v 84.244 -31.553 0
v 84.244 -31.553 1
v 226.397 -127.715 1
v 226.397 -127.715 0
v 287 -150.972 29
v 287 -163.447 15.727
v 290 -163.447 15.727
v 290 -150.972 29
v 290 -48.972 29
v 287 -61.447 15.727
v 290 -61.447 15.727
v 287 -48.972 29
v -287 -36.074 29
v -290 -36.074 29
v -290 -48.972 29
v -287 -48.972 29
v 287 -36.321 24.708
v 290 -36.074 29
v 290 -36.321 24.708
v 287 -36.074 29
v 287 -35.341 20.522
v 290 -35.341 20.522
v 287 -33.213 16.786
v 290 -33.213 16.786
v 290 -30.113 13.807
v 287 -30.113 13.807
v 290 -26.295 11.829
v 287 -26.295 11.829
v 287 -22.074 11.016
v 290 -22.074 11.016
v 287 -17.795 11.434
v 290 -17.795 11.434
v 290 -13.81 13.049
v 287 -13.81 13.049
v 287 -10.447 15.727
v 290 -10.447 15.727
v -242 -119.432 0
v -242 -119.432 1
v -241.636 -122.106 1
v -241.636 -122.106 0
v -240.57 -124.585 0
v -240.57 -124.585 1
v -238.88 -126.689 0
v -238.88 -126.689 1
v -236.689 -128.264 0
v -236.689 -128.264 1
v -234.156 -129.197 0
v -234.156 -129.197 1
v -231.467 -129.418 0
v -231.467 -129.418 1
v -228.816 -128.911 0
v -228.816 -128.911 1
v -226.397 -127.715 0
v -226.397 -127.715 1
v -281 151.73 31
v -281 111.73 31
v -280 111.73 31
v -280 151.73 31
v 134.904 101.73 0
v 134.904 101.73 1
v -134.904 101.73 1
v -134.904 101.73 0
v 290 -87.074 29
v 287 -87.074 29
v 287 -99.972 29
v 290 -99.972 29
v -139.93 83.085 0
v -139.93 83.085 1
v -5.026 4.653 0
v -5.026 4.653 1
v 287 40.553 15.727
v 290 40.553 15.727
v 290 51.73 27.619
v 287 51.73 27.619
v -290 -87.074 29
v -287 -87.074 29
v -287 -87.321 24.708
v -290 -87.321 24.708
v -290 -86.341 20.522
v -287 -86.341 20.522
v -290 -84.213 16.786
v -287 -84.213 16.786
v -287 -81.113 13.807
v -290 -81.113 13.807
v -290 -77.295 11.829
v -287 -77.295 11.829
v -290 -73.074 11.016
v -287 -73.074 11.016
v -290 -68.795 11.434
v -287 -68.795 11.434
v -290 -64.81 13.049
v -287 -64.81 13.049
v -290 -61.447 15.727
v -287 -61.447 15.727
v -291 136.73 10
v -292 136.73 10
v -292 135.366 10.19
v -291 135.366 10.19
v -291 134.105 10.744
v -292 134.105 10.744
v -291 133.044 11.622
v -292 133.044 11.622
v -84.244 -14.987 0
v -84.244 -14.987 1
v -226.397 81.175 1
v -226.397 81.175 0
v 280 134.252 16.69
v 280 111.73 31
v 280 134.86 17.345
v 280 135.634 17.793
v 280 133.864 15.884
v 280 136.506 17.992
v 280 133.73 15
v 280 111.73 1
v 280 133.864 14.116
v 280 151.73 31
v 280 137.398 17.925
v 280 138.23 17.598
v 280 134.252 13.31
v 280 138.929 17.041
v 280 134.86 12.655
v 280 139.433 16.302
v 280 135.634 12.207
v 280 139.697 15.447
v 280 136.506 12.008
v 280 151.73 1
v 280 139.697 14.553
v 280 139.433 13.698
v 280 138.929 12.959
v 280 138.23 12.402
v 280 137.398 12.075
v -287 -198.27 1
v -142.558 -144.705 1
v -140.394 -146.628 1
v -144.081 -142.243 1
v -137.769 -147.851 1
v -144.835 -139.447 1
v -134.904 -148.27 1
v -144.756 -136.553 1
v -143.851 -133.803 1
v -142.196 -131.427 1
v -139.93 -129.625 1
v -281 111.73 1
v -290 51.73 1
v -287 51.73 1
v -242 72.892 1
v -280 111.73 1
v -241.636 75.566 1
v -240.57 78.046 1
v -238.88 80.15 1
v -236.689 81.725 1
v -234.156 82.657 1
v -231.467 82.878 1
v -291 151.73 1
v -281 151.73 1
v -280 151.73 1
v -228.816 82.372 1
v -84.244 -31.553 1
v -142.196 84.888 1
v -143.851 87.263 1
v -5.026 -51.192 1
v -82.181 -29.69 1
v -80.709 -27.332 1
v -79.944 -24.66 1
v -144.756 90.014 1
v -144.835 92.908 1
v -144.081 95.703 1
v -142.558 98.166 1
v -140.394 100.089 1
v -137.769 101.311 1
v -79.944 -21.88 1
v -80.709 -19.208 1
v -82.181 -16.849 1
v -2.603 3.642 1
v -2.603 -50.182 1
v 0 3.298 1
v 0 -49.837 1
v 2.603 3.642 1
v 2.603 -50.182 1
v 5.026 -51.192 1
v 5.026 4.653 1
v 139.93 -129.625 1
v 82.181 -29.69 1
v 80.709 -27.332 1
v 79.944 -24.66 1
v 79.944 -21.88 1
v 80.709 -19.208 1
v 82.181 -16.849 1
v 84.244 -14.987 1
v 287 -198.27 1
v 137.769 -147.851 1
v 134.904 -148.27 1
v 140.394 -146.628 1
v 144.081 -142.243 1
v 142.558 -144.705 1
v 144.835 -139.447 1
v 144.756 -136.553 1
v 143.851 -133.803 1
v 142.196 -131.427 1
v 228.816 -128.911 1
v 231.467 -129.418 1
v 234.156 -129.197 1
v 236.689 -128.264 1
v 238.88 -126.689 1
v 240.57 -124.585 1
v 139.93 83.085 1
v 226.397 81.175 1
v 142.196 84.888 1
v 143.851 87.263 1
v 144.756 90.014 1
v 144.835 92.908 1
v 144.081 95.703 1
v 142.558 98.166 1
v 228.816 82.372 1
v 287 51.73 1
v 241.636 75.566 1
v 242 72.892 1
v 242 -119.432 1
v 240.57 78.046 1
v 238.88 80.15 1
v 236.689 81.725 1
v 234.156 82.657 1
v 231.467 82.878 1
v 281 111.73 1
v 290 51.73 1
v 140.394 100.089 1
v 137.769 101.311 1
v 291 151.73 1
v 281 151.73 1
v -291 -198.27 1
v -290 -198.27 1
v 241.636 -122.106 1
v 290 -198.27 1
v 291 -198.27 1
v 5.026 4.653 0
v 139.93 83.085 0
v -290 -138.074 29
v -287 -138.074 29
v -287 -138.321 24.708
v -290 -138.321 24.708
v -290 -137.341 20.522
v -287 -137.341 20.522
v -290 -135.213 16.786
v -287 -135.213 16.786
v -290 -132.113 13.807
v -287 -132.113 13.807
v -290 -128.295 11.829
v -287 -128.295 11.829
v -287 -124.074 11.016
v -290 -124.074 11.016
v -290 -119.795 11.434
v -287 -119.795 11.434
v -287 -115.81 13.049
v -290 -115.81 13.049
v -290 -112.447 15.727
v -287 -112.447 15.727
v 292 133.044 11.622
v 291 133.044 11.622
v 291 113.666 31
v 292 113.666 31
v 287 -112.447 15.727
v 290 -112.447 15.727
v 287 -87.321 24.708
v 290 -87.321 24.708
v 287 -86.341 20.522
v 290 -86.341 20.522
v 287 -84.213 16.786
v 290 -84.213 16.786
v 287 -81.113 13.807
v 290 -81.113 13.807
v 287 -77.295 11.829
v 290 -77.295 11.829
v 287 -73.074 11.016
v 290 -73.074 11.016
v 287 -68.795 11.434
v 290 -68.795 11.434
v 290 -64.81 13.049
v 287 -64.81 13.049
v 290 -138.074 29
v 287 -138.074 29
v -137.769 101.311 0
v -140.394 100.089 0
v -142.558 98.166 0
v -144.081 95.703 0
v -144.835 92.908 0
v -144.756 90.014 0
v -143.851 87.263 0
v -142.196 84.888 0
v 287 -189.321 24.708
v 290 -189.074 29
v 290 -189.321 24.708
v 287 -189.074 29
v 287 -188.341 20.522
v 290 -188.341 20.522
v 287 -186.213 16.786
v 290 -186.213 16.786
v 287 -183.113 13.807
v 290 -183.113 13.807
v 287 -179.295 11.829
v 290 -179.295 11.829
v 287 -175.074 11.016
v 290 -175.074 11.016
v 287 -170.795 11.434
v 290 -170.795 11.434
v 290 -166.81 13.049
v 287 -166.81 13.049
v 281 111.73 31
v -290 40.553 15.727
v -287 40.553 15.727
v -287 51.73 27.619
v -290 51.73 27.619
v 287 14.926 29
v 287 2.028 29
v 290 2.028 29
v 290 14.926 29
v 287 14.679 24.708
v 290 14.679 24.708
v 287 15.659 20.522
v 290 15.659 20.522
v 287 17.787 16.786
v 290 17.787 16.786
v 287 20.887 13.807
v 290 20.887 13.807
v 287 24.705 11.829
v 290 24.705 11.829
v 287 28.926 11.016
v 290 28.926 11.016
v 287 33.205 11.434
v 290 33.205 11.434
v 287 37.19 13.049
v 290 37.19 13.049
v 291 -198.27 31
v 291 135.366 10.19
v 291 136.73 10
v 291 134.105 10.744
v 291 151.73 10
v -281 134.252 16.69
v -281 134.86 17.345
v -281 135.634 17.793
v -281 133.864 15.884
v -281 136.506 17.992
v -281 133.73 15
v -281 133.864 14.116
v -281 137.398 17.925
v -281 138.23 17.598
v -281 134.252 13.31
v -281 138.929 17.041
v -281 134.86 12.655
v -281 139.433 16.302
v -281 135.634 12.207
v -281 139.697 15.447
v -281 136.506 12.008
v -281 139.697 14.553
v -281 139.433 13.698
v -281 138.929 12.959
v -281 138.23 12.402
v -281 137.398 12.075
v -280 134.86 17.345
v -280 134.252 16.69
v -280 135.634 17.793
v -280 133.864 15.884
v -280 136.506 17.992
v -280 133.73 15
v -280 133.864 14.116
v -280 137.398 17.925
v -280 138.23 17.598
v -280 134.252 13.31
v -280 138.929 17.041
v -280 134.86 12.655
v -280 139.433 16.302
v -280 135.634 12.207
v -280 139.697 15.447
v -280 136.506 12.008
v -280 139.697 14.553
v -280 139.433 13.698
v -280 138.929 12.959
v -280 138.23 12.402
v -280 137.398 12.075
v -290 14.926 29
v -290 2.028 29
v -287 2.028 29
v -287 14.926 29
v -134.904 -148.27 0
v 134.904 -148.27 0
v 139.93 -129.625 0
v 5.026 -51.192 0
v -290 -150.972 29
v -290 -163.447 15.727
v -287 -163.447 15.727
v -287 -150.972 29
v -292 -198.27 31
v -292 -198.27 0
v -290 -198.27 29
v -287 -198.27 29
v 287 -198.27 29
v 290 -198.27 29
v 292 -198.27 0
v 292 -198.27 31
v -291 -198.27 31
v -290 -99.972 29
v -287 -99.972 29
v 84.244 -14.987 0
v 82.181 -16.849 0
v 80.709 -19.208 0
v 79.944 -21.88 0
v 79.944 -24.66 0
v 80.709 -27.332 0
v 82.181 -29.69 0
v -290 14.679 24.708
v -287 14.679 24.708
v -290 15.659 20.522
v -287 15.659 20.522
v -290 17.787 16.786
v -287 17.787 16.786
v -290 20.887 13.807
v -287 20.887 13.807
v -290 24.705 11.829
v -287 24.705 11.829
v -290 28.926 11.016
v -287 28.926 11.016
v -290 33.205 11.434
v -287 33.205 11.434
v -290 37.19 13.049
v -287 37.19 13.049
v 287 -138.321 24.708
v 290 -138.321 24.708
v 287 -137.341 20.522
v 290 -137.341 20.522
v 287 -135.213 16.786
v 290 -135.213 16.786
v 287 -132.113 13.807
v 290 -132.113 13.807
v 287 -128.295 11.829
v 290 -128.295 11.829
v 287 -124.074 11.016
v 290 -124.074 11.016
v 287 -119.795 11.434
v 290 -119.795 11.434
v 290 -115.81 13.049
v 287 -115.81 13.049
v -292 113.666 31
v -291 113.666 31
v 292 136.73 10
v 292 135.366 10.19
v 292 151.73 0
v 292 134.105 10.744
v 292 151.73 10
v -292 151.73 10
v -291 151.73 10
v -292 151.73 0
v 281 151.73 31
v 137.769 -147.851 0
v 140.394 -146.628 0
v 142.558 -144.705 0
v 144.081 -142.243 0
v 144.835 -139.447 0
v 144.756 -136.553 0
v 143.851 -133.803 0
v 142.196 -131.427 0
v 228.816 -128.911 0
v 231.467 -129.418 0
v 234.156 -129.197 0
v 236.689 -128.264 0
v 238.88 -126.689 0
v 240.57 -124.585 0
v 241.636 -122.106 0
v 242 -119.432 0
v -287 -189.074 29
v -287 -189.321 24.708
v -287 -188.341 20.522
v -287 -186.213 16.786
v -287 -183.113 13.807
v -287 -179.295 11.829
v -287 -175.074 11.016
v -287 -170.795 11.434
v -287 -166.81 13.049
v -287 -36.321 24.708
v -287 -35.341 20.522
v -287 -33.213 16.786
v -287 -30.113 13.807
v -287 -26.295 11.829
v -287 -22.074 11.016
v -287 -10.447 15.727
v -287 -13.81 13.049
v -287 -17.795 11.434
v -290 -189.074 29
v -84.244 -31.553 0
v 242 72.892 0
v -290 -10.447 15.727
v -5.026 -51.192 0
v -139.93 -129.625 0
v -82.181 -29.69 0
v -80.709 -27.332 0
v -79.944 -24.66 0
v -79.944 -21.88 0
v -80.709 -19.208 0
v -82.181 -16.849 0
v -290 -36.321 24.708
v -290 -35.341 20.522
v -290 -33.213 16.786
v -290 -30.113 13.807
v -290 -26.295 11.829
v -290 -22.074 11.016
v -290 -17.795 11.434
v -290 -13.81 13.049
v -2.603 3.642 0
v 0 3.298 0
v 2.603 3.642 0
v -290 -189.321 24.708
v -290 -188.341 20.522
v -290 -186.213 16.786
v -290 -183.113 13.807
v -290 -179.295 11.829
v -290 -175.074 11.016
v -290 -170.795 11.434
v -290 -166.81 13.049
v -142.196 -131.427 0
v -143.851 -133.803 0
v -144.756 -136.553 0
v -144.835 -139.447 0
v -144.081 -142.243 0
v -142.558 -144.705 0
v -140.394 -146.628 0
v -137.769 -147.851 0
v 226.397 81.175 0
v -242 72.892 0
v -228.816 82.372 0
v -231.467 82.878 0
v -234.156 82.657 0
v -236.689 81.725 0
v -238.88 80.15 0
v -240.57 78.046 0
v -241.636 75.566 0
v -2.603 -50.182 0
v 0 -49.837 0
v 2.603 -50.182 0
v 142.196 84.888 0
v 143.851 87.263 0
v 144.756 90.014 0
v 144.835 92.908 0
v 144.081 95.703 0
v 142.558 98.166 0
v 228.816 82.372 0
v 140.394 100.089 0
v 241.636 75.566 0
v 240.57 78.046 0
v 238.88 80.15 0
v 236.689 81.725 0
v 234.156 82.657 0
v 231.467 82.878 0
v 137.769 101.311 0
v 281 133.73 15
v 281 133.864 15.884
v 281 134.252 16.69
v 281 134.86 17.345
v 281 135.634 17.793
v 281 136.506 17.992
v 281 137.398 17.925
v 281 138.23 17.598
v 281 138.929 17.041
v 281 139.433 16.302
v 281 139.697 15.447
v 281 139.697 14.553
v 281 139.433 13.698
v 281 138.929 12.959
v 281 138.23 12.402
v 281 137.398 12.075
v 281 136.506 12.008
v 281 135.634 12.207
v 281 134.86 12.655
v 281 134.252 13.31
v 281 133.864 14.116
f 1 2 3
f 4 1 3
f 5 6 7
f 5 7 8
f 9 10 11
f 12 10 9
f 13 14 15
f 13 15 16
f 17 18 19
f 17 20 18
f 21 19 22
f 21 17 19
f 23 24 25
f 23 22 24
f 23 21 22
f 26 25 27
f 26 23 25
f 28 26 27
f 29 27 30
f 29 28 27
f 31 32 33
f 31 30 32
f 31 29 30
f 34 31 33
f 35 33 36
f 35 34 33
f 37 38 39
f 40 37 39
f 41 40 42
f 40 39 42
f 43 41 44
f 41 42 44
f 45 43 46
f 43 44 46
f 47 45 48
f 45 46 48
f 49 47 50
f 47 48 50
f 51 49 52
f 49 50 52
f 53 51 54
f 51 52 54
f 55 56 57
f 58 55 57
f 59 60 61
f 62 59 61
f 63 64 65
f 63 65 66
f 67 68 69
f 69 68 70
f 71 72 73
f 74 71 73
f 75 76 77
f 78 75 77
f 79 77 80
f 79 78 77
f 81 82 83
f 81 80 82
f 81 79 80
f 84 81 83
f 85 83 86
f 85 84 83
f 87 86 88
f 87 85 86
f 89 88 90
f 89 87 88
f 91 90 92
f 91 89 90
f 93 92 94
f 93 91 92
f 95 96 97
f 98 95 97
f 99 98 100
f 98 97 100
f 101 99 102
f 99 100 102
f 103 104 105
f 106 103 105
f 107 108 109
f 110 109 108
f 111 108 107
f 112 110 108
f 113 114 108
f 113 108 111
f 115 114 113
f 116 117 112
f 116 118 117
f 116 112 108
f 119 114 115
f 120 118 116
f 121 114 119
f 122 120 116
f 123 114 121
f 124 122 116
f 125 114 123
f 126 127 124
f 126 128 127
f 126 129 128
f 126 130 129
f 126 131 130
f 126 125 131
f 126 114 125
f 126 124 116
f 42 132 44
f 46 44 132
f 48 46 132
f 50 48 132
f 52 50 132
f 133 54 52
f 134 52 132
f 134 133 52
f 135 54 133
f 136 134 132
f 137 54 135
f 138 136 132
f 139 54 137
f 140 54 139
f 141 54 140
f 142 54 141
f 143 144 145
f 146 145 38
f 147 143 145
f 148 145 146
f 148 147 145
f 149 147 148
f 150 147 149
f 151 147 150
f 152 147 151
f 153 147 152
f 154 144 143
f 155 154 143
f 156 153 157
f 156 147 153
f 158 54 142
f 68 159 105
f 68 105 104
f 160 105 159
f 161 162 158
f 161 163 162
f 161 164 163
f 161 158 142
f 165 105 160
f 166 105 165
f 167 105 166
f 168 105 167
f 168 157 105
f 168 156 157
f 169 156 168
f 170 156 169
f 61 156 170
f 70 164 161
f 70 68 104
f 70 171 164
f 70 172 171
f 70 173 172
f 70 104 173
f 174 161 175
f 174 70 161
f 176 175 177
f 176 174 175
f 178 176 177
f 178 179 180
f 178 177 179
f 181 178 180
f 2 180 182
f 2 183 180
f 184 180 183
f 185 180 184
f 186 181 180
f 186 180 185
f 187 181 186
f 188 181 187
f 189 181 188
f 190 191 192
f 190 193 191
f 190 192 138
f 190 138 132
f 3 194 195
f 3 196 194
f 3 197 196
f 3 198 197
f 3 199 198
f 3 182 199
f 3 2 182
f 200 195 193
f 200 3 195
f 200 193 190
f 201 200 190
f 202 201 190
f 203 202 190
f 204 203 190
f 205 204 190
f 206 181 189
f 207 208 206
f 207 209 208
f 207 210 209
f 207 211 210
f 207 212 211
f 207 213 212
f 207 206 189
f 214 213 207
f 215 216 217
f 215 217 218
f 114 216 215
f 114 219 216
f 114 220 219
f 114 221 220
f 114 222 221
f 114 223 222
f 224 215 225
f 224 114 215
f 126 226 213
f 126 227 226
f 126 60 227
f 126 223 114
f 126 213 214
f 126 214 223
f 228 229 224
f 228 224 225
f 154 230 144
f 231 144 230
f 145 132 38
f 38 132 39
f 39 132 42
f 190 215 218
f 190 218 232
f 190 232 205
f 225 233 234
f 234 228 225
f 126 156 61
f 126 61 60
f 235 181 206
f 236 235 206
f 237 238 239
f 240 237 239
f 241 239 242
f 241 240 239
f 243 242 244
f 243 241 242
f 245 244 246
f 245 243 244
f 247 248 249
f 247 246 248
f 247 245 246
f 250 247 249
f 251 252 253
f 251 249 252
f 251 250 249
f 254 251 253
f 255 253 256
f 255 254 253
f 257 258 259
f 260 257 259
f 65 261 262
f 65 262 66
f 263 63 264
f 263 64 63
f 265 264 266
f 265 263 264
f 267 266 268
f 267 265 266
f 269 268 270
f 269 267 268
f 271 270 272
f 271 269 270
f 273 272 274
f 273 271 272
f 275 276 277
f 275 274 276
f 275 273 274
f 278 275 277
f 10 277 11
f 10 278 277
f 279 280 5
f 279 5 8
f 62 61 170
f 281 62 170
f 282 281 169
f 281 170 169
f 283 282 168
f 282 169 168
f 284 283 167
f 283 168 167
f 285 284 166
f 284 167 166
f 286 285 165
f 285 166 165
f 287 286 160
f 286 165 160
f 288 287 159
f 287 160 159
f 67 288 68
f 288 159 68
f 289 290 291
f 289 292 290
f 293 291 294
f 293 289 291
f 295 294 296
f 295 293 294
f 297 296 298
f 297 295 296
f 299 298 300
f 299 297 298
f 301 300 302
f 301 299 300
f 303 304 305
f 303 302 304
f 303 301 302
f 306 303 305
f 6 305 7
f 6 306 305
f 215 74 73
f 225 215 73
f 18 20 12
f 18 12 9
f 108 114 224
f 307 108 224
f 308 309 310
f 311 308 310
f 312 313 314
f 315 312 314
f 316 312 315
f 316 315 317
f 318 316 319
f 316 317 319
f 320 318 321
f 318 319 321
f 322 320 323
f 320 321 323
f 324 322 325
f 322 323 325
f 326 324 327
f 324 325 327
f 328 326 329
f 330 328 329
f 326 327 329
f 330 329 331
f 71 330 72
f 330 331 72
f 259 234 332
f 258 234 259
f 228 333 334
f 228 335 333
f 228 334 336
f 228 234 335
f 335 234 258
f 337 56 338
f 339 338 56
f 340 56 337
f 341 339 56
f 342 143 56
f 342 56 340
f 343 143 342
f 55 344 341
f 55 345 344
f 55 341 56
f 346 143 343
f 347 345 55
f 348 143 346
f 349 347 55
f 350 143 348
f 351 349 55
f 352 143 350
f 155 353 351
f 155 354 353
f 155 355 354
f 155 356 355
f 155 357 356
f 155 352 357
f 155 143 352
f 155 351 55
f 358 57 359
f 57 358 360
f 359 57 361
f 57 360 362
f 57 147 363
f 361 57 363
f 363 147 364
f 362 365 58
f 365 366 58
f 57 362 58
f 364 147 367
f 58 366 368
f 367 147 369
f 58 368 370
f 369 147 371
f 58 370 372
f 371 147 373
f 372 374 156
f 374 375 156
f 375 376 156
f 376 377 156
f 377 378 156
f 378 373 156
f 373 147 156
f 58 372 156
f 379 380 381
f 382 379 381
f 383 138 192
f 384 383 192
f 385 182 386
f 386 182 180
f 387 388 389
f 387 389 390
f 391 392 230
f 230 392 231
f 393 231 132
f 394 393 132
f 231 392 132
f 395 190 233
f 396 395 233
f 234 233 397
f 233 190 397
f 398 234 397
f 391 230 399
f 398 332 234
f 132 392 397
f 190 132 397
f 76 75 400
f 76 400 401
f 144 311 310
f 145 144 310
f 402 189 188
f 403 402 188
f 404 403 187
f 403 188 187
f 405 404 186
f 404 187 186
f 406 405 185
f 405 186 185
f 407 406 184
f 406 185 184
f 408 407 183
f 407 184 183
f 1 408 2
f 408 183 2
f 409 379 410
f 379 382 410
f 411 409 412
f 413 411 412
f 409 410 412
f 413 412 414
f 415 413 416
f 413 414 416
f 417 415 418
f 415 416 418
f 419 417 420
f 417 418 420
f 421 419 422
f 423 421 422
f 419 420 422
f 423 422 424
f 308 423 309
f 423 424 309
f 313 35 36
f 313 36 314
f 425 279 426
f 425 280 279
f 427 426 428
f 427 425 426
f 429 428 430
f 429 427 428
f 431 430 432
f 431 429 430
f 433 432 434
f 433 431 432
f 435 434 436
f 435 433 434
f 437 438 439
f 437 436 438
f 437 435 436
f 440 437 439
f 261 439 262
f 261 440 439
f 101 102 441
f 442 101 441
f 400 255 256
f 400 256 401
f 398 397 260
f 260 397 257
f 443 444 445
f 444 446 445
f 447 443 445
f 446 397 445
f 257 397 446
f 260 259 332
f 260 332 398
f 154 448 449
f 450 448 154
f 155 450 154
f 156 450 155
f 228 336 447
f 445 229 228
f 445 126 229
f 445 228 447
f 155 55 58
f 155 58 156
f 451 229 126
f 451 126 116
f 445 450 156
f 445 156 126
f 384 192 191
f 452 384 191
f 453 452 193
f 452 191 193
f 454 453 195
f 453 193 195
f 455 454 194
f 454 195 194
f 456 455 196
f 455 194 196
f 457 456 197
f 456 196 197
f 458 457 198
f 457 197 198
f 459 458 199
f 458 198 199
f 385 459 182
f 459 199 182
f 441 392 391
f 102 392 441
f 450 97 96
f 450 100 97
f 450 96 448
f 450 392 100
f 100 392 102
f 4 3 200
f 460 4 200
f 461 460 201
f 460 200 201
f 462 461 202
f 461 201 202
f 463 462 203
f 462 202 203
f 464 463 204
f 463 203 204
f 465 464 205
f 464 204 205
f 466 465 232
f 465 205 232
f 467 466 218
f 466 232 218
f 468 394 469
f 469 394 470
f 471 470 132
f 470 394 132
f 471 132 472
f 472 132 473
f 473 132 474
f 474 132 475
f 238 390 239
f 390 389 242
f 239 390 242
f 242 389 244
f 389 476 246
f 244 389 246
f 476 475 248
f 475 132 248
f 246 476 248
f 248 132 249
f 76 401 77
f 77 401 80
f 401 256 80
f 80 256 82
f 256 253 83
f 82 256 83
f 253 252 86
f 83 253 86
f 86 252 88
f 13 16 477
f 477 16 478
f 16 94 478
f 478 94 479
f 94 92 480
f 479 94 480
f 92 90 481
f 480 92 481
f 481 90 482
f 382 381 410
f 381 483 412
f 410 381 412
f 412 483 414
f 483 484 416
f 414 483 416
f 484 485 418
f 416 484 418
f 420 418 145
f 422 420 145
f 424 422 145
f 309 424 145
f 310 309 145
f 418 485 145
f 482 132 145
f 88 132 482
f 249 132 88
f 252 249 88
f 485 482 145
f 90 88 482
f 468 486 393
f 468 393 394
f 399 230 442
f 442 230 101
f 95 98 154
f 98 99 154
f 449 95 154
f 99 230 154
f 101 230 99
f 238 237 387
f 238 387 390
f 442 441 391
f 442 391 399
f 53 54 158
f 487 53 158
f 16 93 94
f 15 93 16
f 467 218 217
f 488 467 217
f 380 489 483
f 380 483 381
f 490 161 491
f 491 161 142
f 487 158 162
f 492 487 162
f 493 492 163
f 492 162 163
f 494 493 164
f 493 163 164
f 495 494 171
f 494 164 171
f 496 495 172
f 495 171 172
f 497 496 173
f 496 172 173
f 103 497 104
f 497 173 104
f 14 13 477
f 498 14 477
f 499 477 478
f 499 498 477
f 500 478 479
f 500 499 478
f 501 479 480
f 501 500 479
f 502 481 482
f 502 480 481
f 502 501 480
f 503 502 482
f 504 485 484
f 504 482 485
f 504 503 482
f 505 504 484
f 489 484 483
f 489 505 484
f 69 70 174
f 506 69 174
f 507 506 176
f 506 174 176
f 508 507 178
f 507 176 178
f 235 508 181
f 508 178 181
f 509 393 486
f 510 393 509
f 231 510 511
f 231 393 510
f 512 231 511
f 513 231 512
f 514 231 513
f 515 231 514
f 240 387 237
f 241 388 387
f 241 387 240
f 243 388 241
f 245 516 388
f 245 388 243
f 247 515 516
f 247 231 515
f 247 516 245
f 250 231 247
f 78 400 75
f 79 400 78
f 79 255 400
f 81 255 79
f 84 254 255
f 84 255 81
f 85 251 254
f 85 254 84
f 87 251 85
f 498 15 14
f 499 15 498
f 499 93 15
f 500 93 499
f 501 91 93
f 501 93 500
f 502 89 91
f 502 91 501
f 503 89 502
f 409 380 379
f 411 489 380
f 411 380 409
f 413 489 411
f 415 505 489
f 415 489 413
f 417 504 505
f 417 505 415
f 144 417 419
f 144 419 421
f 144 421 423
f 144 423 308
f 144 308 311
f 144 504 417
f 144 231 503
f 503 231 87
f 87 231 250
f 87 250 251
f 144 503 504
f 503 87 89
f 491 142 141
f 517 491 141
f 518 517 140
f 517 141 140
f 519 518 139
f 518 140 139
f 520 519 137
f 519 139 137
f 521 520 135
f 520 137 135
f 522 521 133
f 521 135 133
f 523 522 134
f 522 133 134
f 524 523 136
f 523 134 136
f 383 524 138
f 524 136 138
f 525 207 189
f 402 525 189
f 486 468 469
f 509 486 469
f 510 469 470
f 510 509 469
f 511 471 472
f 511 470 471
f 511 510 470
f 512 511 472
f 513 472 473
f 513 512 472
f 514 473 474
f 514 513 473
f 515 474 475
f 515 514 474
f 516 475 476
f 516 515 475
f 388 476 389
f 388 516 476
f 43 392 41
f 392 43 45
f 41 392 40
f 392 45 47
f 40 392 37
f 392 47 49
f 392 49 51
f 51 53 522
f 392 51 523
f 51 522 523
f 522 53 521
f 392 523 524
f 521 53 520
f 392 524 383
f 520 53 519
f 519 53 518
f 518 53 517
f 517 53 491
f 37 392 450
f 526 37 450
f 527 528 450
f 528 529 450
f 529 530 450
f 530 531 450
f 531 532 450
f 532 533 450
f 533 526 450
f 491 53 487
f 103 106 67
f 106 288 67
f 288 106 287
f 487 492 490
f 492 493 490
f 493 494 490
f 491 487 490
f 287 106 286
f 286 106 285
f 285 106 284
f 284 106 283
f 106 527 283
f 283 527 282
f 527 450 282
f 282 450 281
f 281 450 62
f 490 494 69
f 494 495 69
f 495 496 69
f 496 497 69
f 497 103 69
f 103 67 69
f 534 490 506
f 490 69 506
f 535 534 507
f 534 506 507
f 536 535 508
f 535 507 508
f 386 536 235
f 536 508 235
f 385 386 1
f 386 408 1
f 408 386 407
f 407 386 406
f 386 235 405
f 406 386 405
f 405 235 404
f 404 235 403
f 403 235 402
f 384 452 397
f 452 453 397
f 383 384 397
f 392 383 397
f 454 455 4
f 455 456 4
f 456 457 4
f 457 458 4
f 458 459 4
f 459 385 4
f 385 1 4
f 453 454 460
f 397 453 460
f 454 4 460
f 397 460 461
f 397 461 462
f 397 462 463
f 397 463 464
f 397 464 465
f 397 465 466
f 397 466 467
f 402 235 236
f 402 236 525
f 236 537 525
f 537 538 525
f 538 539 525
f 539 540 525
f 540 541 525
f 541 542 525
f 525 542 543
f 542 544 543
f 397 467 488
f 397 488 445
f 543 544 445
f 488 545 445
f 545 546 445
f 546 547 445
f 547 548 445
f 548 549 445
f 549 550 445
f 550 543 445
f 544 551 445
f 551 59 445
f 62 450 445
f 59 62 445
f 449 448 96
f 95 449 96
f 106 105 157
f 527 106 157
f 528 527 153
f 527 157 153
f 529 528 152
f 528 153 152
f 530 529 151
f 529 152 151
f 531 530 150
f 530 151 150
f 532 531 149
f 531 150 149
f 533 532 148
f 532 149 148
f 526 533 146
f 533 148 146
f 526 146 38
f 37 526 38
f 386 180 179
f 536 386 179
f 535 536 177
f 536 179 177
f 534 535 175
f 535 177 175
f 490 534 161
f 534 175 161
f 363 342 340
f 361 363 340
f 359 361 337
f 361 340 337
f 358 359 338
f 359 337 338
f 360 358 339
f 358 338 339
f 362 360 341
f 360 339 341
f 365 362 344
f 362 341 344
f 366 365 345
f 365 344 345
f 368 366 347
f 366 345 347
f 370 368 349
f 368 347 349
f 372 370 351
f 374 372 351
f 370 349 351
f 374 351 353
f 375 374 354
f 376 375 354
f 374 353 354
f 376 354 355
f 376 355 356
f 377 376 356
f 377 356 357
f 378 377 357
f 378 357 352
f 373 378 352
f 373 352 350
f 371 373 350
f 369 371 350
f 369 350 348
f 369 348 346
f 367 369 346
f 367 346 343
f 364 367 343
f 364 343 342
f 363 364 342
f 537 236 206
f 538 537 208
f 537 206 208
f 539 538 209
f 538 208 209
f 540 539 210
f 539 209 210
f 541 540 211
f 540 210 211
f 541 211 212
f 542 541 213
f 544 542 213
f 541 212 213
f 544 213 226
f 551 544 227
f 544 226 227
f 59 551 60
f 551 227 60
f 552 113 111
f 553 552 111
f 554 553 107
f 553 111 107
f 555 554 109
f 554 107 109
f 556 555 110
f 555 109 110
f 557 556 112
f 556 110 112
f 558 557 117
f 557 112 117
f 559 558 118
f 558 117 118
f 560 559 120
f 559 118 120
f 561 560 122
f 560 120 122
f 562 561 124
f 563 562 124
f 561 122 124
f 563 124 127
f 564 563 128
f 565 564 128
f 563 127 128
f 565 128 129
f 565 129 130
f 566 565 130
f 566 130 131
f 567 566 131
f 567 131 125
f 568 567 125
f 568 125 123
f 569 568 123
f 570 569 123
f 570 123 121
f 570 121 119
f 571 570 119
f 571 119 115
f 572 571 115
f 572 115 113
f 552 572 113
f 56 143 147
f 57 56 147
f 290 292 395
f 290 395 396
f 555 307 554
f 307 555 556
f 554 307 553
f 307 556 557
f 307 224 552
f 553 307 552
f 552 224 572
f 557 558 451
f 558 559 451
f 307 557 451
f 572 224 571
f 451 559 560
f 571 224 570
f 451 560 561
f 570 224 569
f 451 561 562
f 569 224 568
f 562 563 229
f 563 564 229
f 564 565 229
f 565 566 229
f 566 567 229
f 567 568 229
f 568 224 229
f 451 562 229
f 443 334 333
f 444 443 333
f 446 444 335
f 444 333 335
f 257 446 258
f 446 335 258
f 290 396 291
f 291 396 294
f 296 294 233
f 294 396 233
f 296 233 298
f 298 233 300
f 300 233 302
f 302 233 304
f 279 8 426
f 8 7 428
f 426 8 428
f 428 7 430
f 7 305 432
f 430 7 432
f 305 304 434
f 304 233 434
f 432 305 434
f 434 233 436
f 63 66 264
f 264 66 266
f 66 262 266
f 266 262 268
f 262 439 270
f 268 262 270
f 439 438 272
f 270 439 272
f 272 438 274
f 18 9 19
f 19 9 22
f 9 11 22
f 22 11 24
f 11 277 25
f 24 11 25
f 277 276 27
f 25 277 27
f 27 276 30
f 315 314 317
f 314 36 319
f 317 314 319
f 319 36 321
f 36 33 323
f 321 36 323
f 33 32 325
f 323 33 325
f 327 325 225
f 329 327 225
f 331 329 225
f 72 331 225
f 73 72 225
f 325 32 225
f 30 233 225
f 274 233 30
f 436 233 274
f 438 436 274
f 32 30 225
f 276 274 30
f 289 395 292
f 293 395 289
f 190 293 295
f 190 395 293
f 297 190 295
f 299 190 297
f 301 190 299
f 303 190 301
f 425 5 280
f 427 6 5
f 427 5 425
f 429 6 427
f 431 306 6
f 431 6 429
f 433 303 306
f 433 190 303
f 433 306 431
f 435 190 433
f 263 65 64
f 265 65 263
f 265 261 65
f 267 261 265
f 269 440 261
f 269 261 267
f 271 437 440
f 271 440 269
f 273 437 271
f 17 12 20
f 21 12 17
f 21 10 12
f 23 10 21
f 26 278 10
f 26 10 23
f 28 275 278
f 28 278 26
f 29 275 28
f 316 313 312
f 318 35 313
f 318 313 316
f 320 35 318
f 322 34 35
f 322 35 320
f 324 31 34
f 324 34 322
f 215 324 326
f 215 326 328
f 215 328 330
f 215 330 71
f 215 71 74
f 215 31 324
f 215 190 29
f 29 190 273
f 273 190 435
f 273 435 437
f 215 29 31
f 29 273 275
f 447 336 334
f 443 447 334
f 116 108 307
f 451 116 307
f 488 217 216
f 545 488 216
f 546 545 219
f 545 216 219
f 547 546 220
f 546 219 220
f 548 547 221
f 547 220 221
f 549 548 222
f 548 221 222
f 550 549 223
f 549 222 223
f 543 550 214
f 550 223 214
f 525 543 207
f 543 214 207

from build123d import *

# Parameters (mm, degrees)
F0_W      = 584
F0_H      = 350
F1_DEPTH  = 1
F2_W      = 1
F2_H      = 350
F3_DEPTH  = 30
F5_DEPTH  = 645
F6_W      = 1
F6_H      = 40
F7_DEPTH  = 30
F8_R      = 3
F9_DEPTH  = 565
F10_W     = 3
F10_H     = 250
F11_DEPTH = 28
F13_DEPTH = 291
F15_DEPTH = 25


with BuildPart() as f1:
    # F0 (on Top) → F1 (new body)
    with BuildSketch(Plane.XY):
        with Locations((0, -23.2696812643)):
            Rectangle(F0_W, F0_H)
    extrude(amount=F1_DEPTH)

    # F2 (on face) → F3 (join)
    with BuildSketch(Plane.XY.offset(1)):
        with Locations((-291.5, -23.2696812643)):
            Rectangle(F2_W, F2_H)
        with Locations((291.5, -23.2696812643)):
            Rectangle(F2_W, F2_H)
    extrude(amount=F3_DEPTH)

    # F4 (on face) → F5 (cut)
    with BuildSketch(Plane(origin=(-292, 0, 0), x_dir=(0, -1, 0), z_dir=(-1, 0, 0))):
        with BuildLine():
            Line((-136.7303187357, 15), (-136.7303187357, 10))
            ThreePointArc((-136.7303187357, 10), (-134.7165063478, 10.423477339), (-133.0438155245, 11.6221761335))
            ThreePointArc((-133.0438155245, 11.6221761335), (-132.0702481324, 13.1878901877), (-131.7303187357, 15))
            ThreePointArc((-131.7303187357, 15), (-132.1109210732, 16.9134171618), (-133.1947848298, 18.5355339059))
            Line((-133.1947848298, 18.5355339059), (-136.7303187357, 15))
        make_face()
        with BuildLine():
            Line((-151.7303187357, 10), (-136.7303187357, 10))
            ThreePointArc((-136.7303187357, 10), (-141.3497163983, 16.9134171618), (-133.1947848298, 18.5355339059))
            Line((-133.1947848298, 18.5355339059), (-120.7303187357, 31))
            Line((-120.7303187357, 31), (-151.7303187357, 31))
            Line((-151.7303187357, 31), (-151.7303187357, 10))
        make_face()
        with BuildLine():
            ThreePointArc((-133.1947848298, 18.5355339059), (-141.3497163983, 16.9134171618), (-136.7303187357, 10))
            Line((-136.7303187357, 10), (-136.7303187357, 15))
            Line((-136.7303187357, 15), (-133.1947848298, 18.5355339059))
        make_face()
        with BuildLine():
            ThreePointArc((-131.7303187357, 15), (-132.0702481324, 13.1878901877), (-133.0438155245, 11.6221761335))
            Line((-133.0438155245, 11.6221761335), (-113.6659916579, 31))
            Line((-113.6659916579, 31), (-120.7303187357, 31))
            Line((-120.7303187357, 31), (-133.1947848298, 18.5355339059))
            ThreePointArc((-133.1947848298, 18.5355339059), (-132.1109210732, 16.9134171618), (-131.7303187357, 15))
        make_face()
    extrude(amount=-F5_DEPTH, mode=Mode.SUBTRACT)

    # F6 (on face) → F7 (join)
    with BuildSketch(Plane.XY.offset(1)):
        with Locations((-280.5, 131.7303187357)):
            Rectangle(F6_W, F6_H)
        with Locations((280.5, 131.7303187357)):
            Rectangle(F6_W, F6_H)
    extrude(amount=F7_DEPTH)

    # F8 (on face) → F9 (cut)
    with BuildSketch(Plane(origin=(-281, 0, 0), x_dir=(0, -1, 0), z_dir=(-1, 0, 0))):
        with Locations((-136.7303187357, 15)):
            Circle(F8_R)
    extrude(amount=-F9_DEPTH, mode=Mode.SUBTRACT)

    # F10 (on face) → F11 (join)
    with BuildSketch(Plane.XY.offset(1)):
        with Locations((-288.5, -73.2696812643)):
            Rectangle(F10_W, F10_H)
        with Locations((288.5, -73.2696812643)):
            Rectangle(F10_W, F10_H)
    extrude(amount=F11_DEPTH)

    # F12 (on Right) → F13 (cut, symmetric)
    with BuildSketch(Plane.YZ):
        with BuildLine():
            ThreePointArc((-163.4468129313, 15.7271576906), (-160.4315110244, 20.4751748875), (-159.3769872614, 26))
            ThreePointArc((-159.3769872614, 26), (-165.262273131, 37.9131014568), (-178.2999187708, 40.4779352248))
            ThreePointArc((-178.2999187708, 40.4779352248), (-187.238776022, 18.2815552164), (-163.4468129313, 15.7271576906))
        make_face()
        with BuildLine():
            ThreePointArc((-178.2999187708, 40.4779352248), (-165.262273131, 37.9131014568), (-159.3769872614, 26))
            ThreePointArc((-159.3769872614, 26), (-160.4315110244, 20.4751748875), (-163.4468129313, 15.7271576906))
            Line((-163.4468129313, 15.7271576906), (-125.9341510427, 55.6401556402))
            Line((-125.9341510427, 55.6401556402), (-178.2999187708, 40.4779352248))
        make_face()
        with BuildLine():
            ThreePointArc((-112.4468129313, 15.7271576906), (-109.4315110244, 20.4751748875), (-108.3769872614, 26))
            ThreePointArc((-108.3769872614, 26), (-114.262273131, 37.9131014568), (-127.2999187708, 40.4779352248))
            ThreePointArc((-127.2999187708, 40.4779352248), (-136.238776022, 18.2815552164), (-112.4468129313, 15.7271576906))
        make_face()
        with BuildLine():
            ThreePointArc((-127.2999187708, 40.4779352248), (-114.262273131, 37.9131014568), (-108.3769872614, 26))
            ThreePointArc((-108.3769872614, 26), (-109.4315110244, 20.4751748875), (-112.4468129313, 15.7271576906))
            Line((-112.4468129313, 15.7271576906), (-74.9341510427, 55.6401556402))
            Line((-74.9341510427, 55.6401556402), (-127.2999187708, 40.4779352248))
        make_face()
        with BuildLine():
            ThreePointArc((-61.4468129313, 15.7271576906), (-58.4315110244, 20.4751748875), (-57.3769872614, 26))
            ThreePointArc((-57.3769872614, 26), (-63.262273131, 37.9131014568), (-76.2999187708, 40.4779352248))
            ThreePointArc((-76.2999187708, 40.4779352248), (-85.238776022, 18.2815552164), (-61.4468129313, 15.7271576906))
        make_face()
        with BuildLine():
            ThreePointArc((-76.2999187708, 40.4779352248), (-63.262273131, 37.9131014568), (-57.3769872614, 26))
            ThreePointArc((-57.3769872614, 26), (-58.4315110244, 20.4751748875), (-61.4468129313, 15.7271576906))
            Line((-61.4468129313, 15.7271576906), (-23.9341510427, 55.6401556402))
            Line((-23.9341510427, 55.6401556402), (-76.2999187708, 40.4779352248))
        make_face()
        with BuildLine():
            ThreePointArc((-10.4468129313, 15.7271576906), (-7.4315110244, 20.4751748875), (-6.3769872614, 26))
            ThreePointArc((-6.3769872614, 26), (-12.262273131, 37.9131014568), (-25.2999187708, 40.4779352248))
            ThreePointArc((-25.2999187708, 40.4779352248), (-34.238776022, 18.2815552164), (-10.4468129313, 15.7271576906))
        make_face()
        with BuildLine():
            ThreePointArc((-25.2999187708, 40.4779352248), (-12.262273131, 37.9131014568), (-6.3769872614, 26))
            ThreePointArc((-6.3769872614, 26), (-7.4315110244, 20.4751748875), (-10.4468129313, 15.7271576906))
            Line((-10.4468129313, 15.7271576906), (27.0658489573, 55.6401556402))
            Line((27.0658489573, 55.6401556402), (-25.2999187708, 40.4779352248))
        make_face()
        with BuildLine():
            ThreePointArc((40.5531870687, 15.7271576906), (43.5684889756, 20.4751748875), (44.6230127386, 26))
            ThreePointArc((44.6230127386, 26), (38.737726869, 37.9131014568), (25.7000812292, 40.4779352248))
            ThreePointArc((25.7000812292, 40.4779352248), (16.761223978, 18.2815552164), (40.5531870687, 15.7271576906))
        make_face()
        with BuildLine():
            ThreePointArc((25.7000812292, 40.4779352248), (38.737726869, 37.9131014568), (44.6230127386, 26))
            ThreePointArc((44.6230127386, 26), (43.5684889756, 20.4751748875), (40.5531870687, 15.7271576906))
            Line((40.5531870687, 15.7271576906), (78.0658489573, 55.6401556402))
            Line((78.0658489573, 55.6401556402), (25.7000812292, 40.4779352248))
        make_face()
    extrude(amount=F13_DEPTH, both=True, mode=Mode.SUBTRACT)

    # F14 (on face) → F15 (cut)
    with BuildSketch(Plane.XY.offset(1)):
        with BuildLine():
            ThreePointArc((-134.9042718153, 101.7303187357), (-144.5595998436, 94.3331327256), (-139.930476389, 83.0852468689))
            Line((-139.930476389, 83.0852468689), (-5.0262045737, 4.6525306972))
            ThreePointArc((-5.0262045737, 4.6525306972), (0, 3.297602564), (5.0262045737, 4.6525306972))
            Line((5.0262045737, 4.6525306972), (139.930476389, 83.0852468689))
            ThreePointArc((139.930476389, 83.0852468689), (144.5595998436, 94.3331327256), (134.9042718153, 101.7303187357))
            Line((134.9042718153, 101.7303187357), (-134.9042718153, 101.7303187357))
        make_face()
        with BuildLine():
            Line((-5.0262045737, -51.1918932258), (-139.930476389, -129.6246093974))
            ThreePointArc((-139.930476389, -129.6246093974), (-144.5595998436, -140.8724952541), (-134.9042718153, -148.2696812643))
            Line((-134.9042718153, -148.2696812643), (134.9042718153, -148.2696812643))
            ThreePointArc((134.9042718153, -148.2696812643), (144.5595998436, -140.8724952541), (139.930476389, -129.6246093974))
            Line((139.930476389, -129.6246093974), (5.0262045737, -51.1918932258))
            ThreePointArc((5.0262045737, -51.1918932258), (0, -49.8369650926), (-5.0262045737, -51.1918932258))
        make_face()
        with BuildLine():
            Line((-84.2441895854, -14.986847133), (-226.396906323, 81.1752847777))
            ThreePointArc((-226.396906323, 81.1752847777), (-236.6887665345, 81.7250871942), (-242, 72.8924506464))
            Line((-242, 72.8924506464), (-242, -119.431813175))
            ThreePointArc((-242, -119.431813175), (-236.6887665345, -128.2644497228), (-226.396906323, -127.7146473063))
            Line((-226.396906323, -127.7146473063), (-84.2441895854, -31.5525153956))
            ThreePointArc((-84.2441895854, -31.5525153956), (-79.8472832624, -23.2696812643), (-84.2441895854, -14.986847133))
        make_face()
        with BuildLine():
            Line((226.396906323, 81.1752847777), (84.2441895854, -14.986847133))
            ThreePointArc((84.2441895854, -14.986847133), (79.8472832624, -23.2696812643), (84.2441895854, -31.5525153956))
            Line((84.2441895854, -31.5525153956), (226.396906323, -127.7146473063))
            ThreePointArc((226.396906323, -127.7146473063), (236.6887665345, -128.2644497228), (242, -119.431813175))
            Line((242, -119.431813175), (242, 72.8924506464))
            ThreePointArc((242, 72.8924506464), (236.6887665345, 81.7250871942), (226.396906323, 81.1752847777))
        make_face()
    extrude(amount=-F15_DEPTH, mode=Mode.SUBTRACT)


solid = f1.part
